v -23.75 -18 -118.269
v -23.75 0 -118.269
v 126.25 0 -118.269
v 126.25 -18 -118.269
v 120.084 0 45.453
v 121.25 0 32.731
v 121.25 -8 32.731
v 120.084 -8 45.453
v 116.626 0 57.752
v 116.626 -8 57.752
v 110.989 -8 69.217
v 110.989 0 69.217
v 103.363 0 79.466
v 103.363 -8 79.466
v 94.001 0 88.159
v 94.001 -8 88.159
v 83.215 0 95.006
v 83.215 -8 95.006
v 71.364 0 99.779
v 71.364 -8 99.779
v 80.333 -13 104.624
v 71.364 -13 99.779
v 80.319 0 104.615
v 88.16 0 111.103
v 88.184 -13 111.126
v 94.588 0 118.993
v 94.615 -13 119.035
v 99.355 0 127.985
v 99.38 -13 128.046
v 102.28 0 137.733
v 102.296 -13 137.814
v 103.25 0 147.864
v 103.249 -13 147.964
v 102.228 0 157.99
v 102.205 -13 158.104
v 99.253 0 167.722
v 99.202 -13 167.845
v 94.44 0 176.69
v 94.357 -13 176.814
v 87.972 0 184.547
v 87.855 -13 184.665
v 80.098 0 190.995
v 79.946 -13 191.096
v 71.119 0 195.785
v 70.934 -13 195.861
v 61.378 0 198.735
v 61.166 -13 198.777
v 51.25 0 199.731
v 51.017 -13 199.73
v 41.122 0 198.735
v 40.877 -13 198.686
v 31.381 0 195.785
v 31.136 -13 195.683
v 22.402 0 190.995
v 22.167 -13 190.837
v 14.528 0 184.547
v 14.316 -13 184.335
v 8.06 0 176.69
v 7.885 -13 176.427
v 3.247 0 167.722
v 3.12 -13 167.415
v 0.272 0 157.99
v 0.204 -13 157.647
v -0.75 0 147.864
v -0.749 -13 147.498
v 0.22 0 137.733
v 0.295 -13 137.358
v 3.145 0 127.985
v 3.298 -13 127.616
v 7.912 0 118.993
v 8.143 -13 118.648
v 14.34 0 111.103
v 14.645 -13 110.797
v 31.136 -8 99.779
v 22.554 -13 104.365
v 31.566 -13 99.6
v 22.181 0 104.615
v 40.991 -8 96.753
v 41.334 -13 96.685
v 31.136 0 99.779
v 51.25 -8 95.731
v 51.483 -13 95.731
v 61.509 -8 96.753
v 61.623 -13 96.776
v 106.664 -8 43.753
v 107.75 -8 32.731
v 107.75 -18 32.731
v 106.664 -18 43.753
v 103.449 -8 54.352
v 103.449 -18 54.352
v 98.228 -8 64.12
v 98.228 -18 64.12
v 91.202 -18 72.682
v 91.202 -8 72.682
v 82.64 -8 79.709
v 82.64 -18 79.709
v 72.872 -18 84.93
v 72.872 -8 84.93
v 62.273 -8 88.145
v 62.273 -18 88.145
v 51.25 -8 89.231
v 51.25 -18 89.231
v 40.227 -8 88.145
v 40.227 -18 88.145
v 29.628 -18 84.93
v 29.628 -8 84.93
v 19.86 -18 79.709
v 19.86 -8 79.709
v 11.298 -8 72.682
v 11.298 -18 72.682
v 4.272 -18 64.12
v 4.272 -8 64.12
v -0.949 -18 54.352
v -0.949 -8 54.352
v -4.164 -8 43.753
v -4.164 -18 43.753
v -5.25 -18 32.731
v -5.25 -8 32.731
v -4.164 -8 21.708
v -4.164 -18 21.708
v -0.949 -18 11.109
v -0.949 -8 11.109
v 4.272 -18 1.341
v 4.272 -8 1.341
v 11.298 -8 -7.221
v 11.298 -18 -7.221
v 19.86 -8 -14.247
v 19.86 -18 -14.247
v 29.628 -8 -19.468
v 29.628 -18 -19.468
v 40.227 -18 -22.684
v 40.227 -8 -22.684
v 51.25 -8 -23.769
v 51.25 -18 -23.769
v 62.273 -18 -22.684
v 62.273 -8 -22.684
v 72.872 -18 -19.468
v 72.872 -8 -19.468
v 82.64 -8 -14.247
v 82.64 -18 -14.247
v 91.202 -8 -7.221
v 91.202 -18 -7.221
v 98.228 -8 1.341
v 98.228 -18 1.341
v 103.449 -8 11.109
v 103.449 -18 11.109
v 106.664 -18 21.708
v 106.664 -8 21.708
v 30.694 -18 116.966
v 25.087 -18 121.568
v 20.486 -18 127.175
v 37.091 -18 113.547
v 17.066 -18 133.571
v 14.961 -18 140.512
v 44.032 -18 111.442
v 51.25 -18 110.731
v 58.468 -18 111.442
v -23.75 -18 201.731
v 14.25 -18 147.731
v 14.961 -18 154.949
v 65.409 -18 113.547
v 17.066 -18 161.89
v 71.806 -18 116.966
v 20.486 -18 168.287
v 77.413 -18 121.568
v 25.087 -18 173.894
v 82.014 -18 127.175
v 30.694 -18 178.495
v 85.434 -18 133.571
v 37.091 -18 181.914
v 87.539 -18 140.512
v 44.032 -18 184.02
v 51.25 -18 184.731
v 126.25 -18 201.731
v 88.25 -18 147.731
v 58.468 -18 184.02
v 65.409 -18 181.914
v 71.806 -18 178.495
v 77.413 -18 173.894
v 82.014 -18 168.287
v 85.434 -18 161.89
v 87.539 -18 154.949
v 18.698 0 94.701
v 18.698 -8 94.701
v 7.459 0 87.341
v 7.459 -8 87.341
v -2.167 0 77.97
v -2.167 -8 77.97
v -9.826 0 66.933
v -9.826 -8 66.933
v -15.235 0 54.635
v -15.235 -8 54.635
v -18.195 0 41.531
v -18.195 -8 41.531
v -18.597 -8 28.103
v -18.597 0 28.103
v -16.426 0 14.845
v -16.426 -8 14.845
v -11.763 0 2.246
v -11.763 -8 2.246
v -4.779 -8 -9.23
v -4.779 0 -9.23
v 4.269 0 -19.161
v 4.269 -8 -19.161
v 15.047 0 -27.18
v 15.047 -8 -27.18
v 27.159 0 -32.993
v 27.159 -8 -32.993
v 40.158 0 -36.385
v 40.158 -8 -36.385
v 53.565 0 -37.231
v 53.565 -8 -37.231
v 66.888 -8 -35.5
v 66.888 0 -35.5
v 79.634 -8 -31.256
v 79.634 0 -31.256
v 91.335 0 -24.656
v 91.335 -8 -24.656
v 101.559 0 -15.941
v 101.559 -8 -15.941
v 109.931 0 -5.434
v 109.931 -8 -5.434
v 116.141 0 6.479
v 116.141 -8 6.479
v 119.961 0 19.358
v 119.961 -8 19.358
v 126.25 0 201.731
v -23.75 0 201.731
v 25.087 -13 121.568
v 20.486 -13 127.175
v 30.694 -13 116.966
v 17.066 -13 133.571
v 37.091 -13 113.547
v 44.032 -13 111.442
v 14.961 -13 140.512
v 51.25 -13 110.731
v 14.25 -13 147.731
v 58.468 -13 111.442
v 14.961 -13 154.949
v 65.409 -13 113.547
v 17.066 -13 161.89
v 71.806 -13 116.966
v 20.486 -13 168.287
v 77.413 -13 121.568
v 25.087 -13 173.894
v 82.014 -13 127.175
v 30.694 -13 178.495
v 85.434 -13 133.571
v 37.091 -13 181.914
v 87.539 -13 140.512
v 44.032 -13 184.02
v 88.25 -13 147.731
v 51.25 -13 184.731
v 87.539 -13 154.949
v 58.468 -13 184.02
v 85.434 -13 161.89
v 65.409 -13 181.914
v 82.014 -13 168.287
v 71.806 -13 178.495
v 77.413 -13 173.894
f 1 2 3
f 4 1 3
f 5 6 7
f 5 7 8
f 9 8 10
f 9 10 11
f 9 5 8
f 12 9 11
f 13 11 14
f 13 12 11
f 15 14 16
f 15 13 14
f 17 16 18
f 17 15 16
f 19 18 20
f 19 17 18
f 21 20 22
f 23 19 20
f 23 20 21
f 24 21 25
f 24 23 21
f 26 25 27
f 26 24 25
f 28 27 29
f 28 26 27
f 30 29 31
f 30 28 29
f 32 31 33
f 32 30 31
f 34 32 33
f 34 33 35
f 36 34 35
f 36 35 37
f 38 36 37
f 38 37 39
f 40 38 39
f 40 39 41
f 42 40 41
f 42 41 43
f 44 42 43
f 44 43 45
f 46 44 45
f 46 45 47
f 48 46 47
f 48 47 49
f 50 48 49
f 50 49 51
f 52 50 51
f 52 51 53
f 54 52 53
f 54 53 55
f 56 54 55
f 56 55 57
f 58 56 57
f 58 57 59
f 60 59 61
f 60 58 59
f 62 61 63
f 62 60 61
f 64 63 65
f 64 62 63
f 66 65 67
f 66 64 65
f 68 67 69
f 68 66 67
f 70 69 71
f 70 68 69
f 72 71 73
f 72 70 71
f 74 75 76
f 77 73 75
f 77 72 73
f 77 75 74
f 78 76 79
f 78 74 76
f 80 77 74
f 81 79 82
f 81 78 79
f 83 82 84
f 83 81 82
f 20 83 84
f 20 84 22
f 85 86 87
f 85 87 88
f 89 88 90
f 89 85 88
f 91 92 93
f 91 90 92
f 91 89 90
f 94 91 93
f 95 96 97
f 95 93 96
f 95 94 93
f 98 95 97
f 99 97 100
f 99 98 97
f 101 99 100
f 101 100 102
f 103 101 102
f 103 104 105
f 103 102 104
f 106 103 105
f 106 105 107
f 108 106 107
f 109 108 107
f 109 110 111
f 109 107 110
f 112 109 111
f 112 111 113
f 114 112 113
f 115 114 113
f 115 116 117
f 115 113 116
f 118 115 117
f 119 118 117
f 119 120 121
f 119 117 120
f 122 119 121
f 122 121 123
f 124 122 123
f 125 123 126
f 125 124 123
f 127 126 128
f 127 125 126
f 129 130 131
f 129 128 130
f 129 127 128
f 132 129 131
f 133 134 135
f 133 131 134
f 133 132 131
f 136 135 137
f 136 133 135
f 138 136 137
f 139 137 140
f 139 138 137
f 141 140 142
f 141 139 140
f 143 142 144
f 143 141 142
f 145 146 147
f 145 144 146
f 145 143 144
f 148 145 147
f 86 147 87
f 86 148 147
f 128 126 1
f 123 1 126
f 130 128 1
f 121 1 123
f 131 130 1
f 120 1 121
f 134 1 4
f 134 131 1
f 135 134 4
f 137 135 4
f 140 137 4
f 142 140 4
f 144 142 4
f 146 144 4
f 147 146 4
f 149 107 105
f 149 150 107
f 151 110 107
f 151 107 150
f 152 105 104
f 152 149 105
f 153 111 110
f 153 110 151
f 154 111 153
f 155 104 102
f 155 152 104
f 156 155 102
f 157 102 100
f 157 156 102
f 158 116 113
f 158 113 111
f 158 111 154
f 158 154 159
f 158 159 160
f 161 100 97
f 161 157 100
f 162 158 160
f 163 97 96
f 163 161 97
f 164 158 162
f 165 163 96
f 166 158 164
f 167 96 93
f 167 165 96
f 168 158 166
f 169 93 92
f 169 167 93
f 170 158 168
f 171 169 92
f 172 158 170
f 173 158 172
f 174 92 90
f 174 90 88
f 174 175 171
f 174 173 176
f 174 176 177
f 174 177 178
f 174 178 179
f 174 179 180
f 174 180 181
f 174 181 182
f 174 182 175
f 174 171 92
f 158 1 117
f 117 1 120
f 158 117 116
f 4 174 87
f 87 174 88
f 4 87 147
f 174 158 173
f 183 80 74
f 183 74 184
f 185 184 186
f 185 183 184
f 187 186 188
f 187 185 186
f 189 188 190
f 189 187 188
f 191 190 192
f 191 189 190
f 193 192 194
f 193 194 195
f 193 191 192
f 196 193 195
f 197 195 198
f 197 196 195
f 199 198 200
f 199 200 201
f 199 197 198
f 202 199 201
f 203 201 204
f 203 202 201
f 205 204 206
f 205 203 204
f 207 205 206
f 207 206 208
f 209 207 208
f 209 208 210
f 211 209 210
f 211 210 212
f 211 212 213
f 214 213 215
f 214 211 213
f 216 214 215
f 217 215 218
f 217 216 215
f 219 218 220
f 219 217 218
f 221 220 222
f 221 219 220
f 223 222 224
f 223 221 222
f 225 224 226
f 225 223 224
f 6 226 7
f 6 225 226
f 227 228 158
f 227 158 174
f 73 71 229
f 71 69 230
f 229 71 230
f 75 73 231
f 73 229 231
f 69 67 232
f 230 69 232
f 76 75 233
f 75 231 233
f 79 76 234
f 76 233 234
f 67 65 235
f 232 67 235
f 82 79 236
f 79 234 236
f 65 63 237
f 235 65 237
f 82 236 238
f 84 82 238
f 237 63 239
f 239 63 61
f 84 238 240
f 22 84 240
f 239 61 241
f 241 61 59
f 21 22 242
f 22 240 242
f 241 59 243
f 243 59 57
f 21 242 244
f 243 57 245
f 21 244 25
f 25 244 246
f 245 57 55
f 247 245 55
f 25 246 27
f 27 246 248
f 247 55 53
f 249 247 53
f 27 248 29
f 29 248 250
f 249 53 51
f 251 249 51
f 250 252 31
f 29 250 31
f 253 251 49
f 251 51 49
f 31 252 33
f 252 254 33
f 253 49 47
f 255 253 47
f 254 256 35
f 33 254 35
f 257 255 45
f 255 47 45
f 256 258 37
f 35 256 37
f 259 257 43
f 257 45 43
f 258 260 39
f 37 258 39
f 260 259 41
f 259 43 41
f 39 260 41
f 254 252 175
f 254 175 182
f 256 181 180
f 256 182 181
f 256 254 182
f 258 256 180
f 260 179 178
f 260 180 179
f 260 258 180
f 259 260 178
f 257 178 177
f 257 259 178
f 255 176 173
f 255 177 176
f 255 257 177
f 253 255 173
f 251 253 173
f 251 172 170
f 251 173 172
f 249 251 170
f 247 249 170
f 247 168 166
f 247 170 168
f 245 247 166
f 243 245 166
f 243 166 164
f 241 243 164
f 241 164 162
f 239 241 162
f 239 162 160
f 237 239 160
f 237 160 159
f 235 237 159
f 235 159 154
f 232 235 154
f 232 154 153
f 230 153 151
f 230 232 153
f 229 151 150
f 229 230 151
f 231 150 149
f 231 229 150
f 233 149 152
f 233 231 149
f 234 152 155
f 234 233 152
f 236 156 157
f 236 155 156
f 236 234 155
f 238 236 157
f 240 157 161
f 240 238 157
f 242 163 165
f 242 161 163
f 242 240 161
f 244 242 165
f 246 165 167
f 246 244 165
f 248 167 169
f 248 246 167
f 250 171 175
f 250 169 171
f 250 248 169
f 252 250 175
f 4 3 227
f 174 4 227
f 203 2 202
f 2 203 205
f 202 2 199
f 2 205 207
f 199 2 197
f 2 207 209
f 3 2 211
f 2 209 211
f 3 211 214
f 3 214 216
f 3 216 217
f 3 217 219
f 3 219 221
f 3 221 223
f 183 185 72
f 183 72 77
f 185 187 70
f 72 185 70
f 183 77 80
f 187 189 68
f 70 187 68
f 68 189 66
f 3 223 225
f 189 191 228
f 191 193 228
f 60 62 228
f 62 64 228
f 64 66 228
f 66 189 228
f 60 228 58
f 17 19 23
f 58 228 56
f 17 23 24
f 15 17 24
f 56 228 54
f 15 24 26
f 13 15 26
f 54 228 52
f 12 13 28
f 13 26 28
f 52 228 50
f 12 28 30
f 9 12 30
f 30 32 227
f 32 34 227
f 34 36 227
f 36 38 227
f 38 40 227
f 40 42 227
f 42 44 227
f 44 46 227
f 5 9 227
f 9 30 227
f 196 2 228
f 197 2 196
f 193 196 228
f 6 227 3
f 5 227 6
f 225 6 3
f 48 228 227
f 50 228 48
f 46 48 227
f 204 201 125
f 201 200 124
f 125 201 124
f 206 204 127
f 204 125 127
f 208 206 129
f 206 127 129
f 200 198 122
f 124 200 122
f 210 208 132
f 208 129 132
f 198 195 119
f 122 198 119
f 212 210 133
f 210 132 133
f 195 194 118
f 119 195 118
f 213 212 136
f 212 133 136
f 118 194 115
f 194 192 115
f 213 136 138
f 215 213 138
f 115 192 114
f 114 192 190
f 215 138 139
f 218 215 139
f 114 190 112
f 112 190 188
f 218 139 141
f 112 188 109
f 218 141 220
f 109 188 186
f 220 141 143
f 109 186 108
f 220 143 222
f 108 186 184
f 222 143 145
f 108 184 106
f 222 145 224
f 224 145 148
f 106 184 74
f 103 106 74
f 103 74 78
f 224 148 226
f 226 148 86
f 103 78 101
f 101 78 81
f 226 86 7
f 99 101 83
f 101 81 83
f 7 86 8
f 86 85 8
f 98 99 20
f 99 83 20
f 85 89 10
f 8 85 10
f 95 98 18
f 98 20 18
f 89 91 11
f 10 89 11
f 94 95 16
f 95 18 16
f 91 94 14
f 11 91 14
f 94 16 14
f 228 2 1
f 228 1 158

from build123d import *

# Parameters (mm, degrees)
F0_W     = 150
F0_H     = 320
F0_R     = 56.5
F0_R_2   = 37
F1_DEPTH = 18
F2_DEPTH = 8
F3_DEPTH = 13
F4_DEPTH = 25
F5_DEPTH = 25


with BuildPart() as f1:
    # F0 (on Front) → F1 (new body)
    with BuildSketch(Plane.XZ):
        with Locations((51.2499984354, 41.7307654023)):
            Rectangle(F0_W, F0_H)
        with BuildLine():
            ThreePointArc((31.135600184, 99.7785914893), (22.4571929891, 191.0317394622), (103.2499984354, 147.7307654023))
            ThreePointArc((103.2499984354, 147.7307654023), (94.5509724953, 118.9379599561), (71.3643966867, 99.7785914893))
            ThreePointArc((71.3643966867, 99.7785914893), (107.4105178311, 74.5158831023), (121.2499984354, 32.7307654023))
            ThreePointArc((121.2499984354, 32.7307654023), (9.4648807354, -23.4297539934), (31.135600184, 99.7785914893))
        make_face(mode=Mode.SUBTRACT)
        with BuildLine():
            ThreePointArc((71.3643966867, 99.7785914893), (51.2499984354, 95.7307654023), (31.135600184, 99.7785914893))
            ThreePointArc((31.135600184, 99.7785914893), (9.4648807354, -23.4297539934), (121.2499984354, 32.7307654023))
            ThreePointArc((121.2499984354, 32.7307654023), (107.4105178311, 74.5158831023), (71.3643966867, 99.7785914893))
        make_face()
        with Locations((51.2499984354, 32.7307654023)):
            Circle(F0_R, mode=Mode.SUBTRACT)
        with Locations((51.2499984354, 32.7307654023)):
            Circle(F0_R)
        with BuildLine():
            ThreePointArc((71.3643966867, 99.7785914893), (94.5509724953, 118.9379599561), (103.2499984354, 147.7307654023))
            ThreePointArc((103.2499984354, 147.7307654023), (22.4571929891, 191.0317394622), (31.135600184, 99.7785914893))
            ThreePointArc((31.135600184, 99.7785914893), (51.2499984354, 102.7307654023), (71.3643966867, 99.7785914893))
        make_face()
        with Locations((51.2499984354, 147.7307654023)):
            Circle(F0_R_2, mode=Mode.SUBTRACT)
        with Locations((51.2499984354, 147.7307654023)):
            Circle(F0_R_2)
        with BuildLine():
            ThreePointArc((71.3643966867, 99.7785914893), (51.2499984354, 102.7307654023), (31.135600184, 99.7785914893))
            ThreePointArc((31.135600184, 99.7785914893), (51.2499984354, 95.7307654023), (71.3643966867, 99.7785914893))
        make_face()
    extrude(amount=F1_DEPTH)

    # F0 (on Front) → F2 (cut)
    with BuildSketch(Plane.XZ):
        with BuildLine():
            ThreePointArc((71.3643966867, 99.7785914893), (51.2499984354, 95.7307654023), (31.135600184, 99.7785914893))
            ThreePointArc((31.135600184, 99.7785914893), (9.4648807354, -23.4297539934), (121.2499984354, 32.7307654023))
            ThreePointArc((121.2499984354, 32.7307654023), (107.4105178311, 74.5158831023), (71.3643966867, 99.7785914893))
        make_face()
        with Locations((51.2499984354, 32.7307654023)):
            Circle(F0_R, mode=Mode.SUBTRACT)
        with Locations((51.2499984354, 32.7307654023)):
            Circle(F0_R)
        with BuildLine():
            ThreePointArc((71.3643966867, 99.7785914893), (51.2499984354, 102.7307654023), (31.135600184, 99.7785914893))
            ThreePointArc((31.135600184, 99.7785914893), (51.2499984354, 95.7307654023), (71.3643966867, 99.7785914893))
        make_face()
    extrude(amount=F2_DEPTH, mode=Mode.SUBTRACT)

    # F0 (on Front) → F3 (cut)
    with BuildSketch(Plane.XZ):
        with BuildLine():
            ThreePointArc((71.3643966867, 99.7785914893), (94.5509724953, 118.9379599561), (103.2499984354, 147.7307654023))
            ThreePointArc((103.2499984354, 147.7307654023), (22.4571929891, 191.0317394622), (31.135600184, 99.7785914893))
            ThreePointArc((31.135600184, 99.7785914893), (51.2499984354, 102.7307654023), (71.3643966867, 99.7785914893))
        make_face()
        with Locations((51.2499984354, 147.7307654023)):
            Circle(F0_R_2, mode=Mode.SUBTRACT)
        with Locations((51.2499984354, 147.7307654023)):
            Circle(F0_R_2)
        with BuildLine():
            ThreePointArc((71.3643966867, 99.7785914893), (51.2499984354, 102.7307654023), (31.135600184, 99.7785914893))
            ThreePointArc((31.135600184, 99.7785914893), (51.2499984354, 95.7307654023), (71.3643966867, 99.7785914893))
        make_face()
    extrude(amount=F3_DEPTH, mode=Mode.SUBTRACT)

    # F0 (on Front) → F4 (cut)
    with BuildSketch(Plane.XZ):
        with Locations((51.2499984354, 147.7307654023)):
            Circle(F0_R_2)
    extrude(amount=F4_DEPTH, mode=Mode.SUBTRACT)

    # F0 (on Front) → F5 (cut)
    with BuildSketch(Plane.XZ):
        with Locations((51.2499984354, 32.7307654023)):
            Circle(F0_R)
    extrude(amount=F5_DEPTH, mode=Mode.SUBTRACT)


solid = f1.part
